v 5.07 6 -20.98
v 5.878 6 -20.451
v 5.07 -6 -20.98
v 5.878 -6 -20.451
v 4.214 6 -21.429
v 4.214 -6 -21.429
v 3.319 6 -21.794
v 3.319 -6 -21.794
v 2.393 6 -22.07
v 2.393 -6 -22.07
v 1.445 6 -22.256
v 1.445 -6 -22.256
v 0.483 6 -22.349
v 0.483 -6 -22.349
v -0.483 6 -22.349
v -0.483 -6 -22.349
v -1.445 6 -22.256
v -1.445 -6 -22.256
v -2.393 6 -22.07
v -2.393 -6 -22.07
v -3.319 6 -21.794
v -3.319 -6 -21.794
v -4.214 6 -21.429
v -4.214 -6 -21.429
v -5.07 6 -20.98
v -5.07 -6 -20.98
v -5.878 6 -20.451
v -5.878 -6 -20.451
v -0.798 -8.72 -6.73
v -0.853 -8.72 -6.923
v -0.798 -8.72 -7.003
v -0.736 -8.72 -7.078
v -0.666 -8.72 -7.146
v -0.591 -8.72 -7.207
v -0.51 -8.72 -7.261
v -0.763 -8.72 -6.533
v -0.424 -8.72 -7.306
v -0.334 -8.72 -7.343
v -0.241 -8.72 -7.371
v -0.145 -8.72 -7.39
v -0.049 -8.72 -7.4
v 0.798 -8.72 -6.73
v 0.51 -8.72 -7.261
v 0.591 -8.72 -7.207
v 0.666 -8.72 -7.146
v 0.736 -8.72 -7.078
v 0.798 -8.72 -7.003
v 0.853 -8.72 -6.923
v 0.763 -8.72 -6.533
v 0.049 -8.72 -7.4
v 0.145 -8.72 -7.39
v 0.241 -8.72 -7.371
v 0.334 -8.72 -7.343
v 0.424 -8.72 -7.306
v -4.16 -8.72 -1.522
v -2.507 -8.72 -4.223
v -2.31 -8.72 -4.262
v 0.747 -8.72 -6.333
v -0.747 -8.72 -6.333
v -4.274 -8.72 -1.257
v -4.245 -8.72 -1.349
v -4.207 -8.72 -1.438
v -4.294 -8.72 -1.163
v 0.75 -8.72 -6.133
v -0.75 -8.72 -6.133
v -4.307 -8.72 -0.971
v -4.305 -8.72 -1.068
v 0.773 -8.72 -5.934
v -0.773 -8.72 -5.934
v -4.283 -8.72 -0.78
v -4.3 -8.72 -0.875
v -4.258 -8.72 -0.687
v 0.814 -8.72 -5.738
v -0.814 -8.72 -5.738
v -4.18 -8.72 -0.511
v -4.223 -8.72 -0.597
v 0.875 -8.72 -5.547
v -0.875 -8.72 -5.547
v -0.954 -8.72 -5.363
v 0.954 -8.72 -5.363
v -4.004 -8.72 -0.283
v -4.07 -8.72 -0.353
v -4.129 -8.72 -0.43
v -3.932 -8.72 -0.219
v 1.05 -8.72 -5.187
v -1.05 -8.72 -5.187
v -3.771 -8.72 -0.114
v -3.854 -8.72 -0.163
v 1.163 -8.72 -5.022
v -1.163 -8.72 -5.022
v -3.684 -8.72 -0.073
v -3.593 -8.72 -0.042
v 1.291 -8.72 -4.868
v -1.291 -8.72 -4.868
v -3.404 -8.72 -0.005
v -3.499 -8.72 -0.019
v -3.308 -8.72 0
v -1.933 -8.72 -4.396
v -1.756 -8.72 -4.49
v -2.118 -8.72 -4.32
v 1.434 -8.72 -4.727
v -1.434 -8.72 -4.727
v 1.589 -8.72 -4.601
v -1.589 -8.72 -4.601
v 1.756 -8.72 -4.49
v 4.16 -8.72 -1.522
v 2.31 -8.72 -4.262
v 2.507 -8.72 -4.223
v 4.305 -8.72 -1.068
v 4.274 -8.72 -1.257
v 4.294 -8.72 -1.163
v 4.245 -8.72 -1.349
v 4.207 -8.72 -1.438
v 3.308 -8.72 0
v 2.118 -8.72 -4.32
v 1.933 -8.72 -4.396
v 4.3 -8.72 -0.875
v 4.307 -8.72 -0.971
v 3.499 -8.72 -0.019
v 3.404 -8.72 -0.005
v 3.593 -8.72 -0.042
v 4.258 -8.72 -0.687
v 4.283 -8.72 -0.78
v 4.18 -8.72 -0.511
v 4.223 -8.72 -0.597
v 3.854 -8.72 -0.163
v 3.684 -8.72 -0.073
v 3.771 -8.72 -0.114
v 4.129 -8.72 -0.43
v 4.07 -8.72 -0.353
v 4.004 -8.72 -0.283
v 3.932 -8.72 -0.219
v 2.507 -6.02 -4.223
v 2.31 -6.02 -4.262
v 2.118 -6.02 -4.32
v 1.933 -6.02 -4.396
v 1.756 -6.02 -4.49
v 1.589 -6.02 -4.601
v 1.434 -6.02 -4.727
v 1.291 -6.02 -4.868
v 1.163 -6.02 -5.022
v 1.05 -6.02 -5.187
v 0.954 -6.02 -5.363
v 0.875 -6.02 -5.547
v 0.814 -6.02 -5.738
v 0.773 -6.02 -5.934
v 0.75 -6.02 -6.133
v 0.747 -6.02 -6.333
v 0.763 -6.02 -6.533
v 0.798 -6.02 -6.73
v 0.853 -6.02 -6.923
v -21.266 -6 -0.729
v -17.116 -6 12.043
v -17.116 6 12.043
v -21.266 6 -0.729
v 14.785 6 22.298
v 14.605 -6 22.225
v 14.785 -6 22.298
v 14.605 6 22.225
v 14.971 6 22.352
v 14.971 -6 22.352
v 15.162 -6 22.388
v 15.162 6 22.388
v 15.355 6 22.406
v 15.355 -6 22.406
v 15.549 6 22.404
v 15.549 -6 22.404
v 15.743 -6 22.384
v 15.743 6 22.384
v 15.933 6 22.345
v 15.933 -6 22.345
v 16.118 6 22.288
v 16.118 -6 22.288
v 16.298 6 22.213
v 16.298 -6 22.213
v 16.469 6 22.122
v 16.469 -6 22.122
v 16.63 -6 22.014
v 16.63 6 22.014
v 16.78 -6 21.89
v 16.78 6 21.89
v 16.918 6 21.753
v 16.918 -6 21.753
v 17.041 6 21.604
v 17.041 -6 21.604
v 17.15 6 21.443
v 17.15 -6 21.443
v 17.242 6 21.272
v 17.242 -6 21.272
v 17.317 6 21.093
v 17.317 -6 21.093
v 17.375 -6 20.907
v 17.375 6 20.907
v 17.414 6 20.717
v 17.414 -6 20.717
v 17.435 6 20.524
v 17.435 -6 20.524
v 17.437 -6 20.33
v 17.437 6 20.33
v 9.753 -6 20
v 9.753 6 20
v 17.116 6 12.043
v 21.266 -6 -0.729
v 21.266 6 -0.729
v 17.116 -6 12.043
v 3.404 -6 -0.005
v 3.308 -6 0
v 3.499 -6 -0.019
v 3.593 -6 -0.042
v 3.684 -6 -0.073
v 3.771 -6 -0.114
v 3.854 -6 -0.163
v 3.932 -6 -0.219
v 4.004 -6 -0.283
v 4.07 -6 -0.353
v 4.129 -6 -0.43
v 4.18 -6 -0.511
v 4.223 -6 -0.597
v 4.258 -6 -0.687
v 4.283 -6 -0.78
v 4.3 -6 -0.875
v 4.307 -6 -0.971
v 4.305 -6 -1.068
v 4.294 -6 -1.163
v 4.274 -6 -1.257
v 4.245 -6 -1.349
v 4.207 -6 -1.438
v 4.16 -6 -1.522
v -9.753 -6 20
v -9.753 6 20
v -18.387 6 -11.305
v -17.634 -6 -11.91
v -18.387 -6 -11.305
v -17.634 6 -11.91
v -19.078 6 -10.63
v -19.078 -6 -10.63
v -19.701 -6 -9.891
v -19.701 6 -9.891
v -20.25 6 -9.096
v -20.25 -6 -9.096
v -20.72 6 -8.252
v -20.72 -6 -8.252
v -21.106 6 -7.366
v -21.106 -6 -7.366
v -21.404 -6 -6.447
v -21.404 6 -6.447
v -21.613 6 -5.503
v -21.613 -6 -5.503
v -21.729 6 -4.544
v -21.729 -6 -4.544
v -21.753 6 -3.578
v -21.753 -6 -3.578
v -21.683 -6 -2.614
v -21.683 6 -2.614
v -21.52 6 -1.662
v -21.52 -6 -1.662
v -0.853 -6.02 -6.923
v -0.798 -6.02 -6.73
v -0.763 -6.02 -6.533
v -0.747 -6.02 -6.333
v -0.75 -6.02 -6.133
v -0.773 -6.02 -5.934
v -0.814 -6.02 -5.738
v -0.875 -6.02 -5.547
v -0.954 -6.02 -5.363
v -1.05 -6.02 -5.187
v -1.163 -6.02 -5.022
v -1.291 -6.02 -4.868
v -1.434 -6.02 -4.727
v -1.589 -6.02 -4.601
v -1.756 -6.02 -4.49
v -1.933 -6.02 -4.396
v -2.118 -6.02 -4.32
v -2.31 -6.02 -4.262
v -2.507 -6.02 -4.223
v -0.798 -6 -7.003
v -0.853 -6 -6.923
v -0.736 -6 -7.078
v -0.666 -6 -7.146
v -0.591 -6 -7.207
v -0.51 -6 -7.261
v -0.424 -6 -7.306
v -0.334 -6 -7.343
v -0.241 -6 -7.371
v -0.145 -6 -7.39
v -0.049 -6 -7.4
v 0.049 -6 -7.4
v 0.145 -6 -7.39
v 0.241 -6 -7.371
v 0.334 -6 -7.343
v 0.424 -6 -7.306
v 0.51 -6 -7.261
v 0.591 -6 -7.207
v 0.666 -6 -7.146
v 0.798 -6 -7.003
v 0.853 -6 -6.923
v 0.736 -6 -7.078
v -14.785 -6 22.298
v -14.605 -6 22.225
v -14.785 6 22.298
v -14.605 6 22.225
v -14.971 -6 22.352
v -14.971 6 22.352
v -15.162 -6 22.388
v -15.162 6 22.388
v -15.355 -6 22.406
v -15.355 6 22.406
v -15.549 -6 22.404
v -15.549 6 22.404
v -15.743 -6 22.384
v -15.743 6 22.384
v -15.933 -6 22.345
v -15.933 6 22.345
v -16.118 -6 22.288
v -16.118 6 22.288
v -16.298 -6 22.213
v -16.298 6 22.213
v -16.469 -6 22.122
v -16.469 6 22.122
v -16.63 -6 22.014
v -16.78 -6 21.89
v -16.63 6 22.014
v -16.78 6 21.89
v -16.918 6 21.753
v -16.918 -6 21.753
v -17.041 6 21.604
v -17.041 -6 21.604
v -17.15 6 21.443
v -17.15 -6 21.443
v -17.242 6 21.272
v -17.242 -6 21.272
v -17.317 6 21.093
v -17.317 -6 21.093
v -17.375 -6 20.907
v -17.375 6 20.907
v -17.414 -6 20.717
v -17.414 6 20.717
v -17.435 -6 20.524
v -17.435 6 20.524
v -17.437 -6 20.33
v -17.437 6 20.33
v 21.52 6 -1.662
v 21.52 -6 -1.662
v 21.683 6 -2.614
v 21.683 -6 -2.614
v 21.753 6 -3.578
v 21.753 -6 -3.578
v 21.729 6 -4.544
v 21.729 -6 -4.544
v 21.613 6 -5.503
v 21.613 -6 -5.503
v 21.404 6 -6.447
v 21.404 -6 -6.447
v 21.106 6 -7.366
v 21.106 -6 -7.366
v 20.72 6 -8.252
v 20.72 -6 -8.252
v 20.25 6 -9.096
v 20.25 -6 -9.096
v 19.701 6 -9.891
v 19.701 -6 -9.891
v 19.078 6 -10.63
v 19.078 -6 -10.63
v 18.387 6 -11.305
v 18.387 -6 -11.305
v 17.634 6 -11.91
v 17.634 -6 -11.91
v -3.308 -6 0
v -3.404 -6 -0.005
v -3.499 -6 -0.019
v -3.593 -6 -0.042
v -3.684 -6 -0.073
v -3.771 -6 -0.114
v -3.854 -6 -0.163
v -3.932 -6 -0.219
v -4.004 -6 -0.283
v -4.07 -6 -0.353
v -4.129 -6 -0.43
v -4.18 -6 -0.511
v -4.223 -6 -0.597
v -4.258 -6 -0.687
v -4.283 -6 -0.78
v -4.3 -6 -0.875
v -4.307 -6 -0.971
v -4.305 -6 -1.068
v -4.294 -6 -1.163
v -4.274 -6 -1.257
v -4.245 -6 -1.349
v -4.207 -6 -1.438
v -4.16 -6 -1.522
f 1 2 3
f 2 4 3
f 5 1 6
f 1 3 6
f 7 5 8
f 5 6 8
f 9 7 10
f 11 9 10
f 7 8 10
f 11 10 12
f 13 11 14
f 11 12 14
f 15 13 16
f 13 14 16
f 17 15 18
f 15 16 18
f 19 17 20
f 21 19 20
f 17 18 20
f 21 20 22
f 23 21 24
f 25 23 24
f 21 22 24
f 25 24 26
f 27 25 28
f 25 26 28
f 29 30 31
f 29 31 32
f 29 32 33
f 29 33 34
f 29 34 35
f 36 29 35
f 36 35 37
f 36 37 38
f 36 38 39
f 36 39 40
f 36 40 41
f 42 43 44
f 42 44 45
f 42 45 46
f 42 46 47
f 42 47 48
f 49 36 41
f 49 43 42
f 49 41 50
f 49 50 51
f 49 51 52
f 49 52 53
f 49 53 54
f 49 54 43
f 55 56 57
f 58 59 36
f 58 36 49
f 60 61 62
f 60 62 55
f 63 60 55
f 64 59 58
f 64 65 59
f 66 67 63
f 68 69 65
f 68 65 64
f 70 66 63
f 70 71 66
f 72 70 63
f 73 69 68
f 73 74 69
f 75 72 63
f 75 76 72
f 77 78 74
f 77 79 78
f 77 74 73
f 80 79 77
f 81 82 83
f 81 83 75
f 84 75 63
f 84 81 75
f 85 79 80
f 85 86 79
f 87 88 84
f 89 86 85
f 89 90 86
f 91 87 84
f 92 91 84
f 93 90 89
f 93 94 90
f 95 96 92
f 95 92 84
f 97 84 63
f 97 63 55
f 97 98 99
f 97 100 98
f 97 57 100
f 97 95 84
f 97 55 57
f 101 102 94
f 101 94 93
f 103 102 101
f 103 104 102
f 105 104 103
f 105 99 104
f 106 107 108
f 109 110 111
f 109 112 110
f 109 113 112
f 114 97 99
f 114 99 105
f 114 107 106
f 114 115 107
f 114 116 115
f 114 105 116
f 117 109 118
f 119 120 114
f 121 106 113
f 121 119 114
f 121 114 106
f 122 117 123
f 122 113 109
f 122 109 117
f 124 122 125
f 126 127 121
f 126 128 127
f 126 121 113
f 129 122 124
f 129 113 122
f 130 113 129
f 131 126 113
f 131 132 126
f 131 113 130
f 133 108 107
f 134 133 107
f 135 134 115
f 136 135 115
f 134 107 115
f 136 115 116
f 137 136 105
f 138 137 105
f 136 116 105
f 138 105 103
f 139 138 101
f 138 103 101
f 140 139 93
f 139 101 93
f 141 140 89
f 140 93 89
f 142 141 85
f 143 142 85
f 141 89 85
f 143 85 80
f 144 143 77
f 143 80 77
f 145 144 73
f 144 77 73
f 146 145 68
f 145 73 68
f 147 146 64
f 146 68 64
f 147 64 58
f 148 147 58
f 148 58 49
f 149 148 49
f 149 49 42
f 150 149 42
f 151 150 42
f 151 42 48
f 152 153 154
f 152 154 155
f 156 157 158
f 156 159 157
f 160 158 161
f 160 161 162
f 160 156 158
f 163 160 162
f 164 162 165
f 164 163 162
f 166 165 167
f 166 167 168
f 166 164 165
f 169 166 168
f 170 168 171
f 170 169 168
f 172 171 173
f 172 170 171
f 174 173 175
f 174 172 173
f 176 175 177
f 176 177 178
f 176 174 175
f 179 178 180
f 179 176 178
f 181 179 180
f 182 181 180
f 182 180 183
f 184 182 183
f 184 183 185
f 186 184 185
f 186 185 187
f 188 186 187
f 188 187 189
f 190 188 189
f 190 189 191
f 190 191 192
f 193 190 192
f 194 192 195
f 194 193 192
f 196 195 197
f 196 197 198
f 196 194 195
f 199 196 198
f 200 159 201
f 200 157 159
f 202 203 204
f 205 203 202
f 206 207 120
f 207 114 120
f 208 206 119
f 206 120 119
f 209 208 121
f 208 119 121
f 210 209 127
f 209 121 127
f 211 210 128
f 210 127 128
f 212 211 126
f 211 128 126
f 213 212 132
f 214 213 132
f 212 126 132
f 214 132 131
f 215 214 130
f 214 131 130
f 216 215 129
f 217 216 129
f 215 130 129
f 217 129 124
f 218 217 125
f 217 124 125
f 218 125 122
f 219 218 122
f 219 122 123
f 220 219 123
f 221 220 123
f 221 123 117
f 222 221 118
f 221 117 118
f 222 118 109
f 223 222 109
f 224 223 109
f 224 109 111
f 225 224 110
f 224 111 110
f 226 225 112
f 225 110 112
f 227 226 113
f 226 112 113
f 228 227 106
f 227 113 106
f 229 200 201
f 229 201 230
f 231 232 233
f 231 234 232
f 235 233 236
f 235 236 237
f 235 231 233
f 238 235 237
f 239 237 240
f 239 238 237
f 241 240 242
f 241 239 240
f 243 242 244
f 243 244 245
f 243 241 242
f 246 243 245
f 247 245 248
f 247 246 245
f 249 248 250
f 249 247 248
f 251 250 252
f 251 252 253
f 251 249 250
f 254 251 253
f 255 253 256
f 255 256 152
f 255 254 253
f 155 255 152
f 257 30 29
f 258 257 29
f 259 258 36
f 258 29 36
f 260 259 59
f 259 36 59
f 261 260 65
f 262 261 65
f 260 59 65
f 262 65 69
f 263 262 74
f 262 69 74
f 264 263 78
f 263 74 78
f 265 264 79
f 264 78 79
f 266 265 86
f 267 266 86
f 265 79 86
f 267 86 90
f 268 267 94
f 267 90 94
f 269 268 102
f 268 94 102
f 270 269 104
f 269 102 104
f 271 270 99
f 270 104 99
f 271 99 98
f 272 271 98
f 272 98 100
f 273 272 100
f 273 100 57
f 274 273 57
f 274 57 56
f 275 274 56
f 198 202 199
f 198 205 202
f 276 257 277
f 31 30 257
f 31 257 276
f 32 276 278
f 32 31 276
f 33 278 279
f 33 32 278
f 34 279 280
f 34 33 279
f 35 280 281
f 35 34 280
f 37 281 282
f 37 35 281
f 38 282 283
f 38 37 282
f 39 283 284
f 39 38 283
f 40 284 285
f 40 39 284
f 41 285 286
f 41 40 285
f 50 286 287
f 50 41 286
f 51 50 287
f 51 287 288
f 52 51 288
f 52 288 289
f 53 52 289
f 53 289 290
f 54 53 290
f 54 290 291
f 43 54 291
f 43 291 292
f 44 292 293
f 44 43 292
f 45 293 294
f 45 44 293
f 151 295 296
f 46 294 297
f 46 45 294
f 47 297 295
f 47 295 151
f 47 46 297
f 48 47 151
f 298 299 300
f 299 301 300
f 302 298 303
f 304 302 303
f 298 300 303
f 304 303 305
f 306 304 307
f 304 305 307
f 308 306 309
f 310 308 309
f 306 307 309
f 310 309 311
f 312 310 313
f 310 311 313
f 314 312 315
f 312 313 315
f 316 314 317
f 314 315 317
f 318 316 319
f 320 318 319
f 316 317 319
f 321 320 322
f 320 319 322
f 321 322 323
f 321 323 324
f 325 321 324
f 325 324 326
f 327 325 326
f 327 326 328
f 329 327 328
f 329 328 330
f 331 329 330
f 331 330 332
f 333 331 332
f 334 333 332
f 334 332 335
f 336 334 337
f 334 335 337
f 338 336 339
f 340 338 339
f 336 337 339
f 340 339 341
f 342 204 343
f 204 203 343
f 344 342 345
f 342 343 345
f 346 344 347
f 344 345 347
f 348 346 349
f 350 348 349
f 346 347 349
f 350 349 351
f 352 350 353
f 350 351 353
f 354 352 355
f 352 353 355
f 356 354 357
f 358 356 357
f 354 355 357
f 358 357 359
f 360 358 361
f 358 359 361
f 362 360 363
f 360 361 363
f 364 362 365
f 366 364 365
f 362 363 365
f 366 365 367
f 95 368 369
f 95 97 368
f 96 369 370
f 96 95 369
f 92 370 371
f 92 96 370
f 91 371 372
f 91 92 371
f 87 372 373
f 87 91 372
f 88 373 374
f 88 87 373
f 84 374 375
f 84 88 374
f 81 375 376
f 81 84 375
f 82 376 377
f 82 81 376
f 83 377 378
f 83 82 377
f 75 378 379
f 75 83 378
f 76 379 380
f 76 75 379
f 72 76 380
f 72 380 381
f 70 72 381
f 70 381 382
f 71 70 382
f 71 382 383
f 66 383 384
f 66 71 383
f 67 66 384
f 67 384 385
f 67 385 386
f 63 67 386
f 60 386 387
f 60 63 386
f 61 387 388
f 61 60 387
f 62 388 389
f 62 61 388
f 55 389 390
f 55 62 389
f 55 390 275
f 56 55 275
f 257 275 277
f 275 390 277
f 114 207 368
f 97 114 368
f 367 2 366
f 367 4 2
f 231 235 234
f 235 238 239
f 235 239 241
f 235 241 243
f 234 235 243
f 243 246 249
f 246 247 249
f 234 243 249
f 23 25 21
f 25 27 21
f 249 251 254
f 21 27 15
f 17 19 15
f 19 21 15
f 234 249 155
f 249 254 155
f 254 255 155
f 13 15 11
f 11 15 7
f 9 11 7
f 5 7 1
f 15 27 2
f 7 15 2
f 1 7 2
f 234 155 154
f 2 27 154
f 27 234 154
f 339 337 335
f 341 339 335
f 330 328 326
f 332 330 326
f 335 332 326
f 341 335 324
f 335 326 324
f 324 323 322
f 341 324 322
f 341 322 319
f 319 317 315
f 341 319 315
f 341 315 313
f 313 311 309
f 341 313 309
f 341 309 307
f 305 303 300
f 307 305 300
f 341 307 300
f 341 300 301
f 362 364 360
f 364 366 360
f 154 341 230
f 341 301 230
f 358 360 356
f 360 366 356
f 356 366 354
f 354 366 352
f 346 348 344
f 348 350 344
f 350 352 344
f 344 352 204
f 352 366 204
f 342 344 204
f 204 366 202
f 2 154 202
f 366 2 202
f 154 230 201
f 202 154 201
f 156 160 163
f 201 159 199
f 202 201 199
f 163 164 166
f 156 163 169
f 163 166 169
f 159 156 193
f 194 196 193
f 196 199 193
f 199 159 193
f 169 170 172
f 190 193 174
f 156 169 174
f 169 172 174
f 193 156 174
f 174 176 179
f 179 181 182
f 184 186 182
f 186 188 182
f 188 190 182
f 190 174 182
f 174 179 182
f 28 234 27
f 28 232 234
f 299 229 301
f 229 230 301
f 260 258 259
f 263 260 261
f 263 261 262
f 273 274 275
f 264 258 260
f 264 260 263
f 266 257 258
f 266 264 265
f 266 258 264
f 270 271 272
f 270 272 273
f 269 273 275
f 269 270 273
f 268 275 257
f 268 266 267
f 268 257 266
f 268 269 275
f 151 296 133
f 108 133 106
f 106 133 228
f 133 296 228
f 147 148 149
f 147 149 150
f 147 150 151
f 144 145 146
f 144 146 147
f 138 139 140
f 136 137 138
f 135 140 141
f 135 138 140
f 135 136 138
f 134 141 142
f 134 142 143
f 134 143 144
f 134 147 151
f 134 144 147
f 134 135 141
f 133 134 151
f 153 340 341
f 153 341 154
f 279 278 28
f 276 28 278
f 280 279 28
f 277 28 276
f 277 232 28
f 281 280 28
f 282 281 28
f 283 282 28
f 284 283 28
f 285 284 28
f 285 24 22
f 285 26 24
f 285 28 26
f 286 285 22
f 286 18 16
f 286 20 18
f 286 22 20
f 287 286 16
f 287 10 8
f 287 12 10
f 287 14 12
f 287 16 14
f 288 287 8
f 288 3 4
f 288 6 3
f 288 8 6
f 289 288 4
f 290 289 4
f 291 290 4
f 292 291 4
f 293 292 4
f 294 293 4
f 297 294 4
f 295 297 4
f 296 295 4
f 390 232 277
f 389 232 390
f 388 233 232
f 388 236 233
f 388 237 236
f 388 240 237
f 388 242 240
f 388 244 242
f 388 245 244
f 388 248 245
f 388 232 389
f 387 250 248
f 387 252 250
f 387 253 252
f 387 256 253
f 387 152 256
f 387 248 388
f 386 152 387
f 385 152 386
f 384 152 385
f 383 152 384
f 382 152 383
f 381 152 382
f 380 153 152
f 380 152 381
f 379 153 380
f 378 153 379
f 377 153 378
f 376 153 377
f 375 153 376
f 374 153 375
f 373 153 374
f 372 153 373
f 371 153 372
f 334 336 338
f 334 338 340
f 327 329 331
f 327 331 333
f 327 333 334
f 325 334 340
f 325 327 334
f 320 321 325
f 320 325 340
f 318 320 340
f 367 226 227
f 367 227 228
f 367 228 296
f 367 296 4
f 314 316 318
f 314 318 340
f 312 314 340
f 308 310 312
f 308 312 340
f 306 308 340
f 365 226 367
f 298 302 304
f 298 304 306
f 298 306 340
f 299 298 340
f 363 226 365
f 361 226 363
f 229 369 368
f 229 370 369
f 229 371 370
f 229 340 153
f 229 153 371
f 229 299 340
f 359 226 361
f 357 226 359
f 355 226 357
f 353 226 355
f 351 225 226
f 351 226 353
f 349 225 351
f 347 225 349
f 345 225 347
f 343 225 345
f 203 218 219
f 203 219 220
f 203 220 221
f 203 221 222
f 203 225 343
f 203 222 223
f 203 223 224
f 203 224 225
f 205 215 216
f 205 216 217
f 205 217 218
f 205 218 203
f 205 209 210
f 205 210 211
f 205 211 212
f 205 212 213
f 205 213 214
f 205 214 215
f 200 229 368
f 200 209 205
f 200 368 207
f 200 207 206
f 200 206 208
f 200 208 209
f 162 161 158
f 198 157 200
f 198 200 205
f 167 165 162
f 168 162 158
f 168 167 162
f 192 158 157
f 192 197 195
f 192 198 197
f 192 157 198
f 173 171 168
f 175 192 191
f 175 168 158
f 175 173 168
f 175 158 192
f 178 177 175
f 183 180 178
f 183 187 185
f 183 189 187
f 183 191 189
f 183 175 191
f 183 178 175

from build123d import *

# Parameters (mm, degrees)
F1_DEPTH  = 6
F3_DEPTH  = 6
F5_R      = 2
F6_R      = 10
F9_DEPTH  = 2.7195
F10_R     = 1
F18_DEPTH = 2.7


# Not quite as in the source:
# - the program builds the solid bodies; features that only make, move or delete a surface that nothing else refers to are left out


with BuildPart() as f1:
    # F0 (on Front) → F1 (new body, symmetric)
    with BuildSketch(Plane.XZ):
        Polygon((-23.5114100917, -7.639320225), (0, -24.72135955), (23.5114100917, -7.639320225), (14.5308505601, 20), (-14.5308505601, 20), align=None)
    extrude(amount=F1_DEPTH, both=True)

    # F2 (on Front) → F3 (join, symmetric)
    with BuildSketch(Plane.XZ):
        Polygon((-17.5627600402, 23.5819537193), (-17.116108973, 12.0433927434), (-9.7525370519, 20), align=None)
        Polygon((17.5627600402, 23.5819537193), (9.7525370519, 20), (17.116108973, 12.0433927434), align=None)
    extrude(amount=F3_DEPTH, both=True)

    # F5
    f5_edges = [f1.edges().sort_by_distance(p)[0] for p in [
        (-17.56276, 0, 23.581954),
        (17.56276, 0, 23.581954),
    ]]
    fillet(f5_edges, radius=F5_R)

    # F6
    f6_edges = [f1.edges().sort_by_distance(p)[0] for p in [
        (-23.51141, 0, -7.63932),
        (23.51141, 0, -7.63932),
        (0, 0, -24.72136),
    ]]
    fillet(f6_edges, radius=F6_R)

    # F8 (on face) → F9 (join)
    with BuildSketch(Plane.XZ.offset(6)):
        Polygon((5.0926953554, 0), (-5.0926953554, 0), (0, -8.3154477179), align=None)
    extrude(amount=F9_DEPTH)

    # F10
    f10_edges = [f1.edges().sort_by_distance(p)[0] for p in [
        (0, -7.35975, -8.315448),
        (-5.092695, -7.35975, 0),
        (5.092695, -7.35975, 0),
    ]]
    fillet(f10_edges, radius=F10_R)

    # F17 (on face) → F18 (cut)
    with BuildSketch(Plane.XZ.offset(8.7195)):
        with BuildLine():
            Line((0.8527780007, -6.9230159338), (2.5065876623, -4.2226447518))
            ThreePointArc((2.5065876623, -4.2226447518), (1.0499427142, -5.1871536265), (0.8527780007, -6.9230159338))
        make_face()
        with BuildLine():
            Line((-2.5065876623, -4.2226447518), (-0.8527780007, -6.9230159338))
            ThreePointArc((-0.8527780007, -6.9230159338), (-1.0499427142, -5.1871536265), (-2.5065876623, -4.2226447518))
        make_face()
    extrude(amount=-F18_DEPTH, mode=Mode.SUBTRACT)


solid = f1.part
